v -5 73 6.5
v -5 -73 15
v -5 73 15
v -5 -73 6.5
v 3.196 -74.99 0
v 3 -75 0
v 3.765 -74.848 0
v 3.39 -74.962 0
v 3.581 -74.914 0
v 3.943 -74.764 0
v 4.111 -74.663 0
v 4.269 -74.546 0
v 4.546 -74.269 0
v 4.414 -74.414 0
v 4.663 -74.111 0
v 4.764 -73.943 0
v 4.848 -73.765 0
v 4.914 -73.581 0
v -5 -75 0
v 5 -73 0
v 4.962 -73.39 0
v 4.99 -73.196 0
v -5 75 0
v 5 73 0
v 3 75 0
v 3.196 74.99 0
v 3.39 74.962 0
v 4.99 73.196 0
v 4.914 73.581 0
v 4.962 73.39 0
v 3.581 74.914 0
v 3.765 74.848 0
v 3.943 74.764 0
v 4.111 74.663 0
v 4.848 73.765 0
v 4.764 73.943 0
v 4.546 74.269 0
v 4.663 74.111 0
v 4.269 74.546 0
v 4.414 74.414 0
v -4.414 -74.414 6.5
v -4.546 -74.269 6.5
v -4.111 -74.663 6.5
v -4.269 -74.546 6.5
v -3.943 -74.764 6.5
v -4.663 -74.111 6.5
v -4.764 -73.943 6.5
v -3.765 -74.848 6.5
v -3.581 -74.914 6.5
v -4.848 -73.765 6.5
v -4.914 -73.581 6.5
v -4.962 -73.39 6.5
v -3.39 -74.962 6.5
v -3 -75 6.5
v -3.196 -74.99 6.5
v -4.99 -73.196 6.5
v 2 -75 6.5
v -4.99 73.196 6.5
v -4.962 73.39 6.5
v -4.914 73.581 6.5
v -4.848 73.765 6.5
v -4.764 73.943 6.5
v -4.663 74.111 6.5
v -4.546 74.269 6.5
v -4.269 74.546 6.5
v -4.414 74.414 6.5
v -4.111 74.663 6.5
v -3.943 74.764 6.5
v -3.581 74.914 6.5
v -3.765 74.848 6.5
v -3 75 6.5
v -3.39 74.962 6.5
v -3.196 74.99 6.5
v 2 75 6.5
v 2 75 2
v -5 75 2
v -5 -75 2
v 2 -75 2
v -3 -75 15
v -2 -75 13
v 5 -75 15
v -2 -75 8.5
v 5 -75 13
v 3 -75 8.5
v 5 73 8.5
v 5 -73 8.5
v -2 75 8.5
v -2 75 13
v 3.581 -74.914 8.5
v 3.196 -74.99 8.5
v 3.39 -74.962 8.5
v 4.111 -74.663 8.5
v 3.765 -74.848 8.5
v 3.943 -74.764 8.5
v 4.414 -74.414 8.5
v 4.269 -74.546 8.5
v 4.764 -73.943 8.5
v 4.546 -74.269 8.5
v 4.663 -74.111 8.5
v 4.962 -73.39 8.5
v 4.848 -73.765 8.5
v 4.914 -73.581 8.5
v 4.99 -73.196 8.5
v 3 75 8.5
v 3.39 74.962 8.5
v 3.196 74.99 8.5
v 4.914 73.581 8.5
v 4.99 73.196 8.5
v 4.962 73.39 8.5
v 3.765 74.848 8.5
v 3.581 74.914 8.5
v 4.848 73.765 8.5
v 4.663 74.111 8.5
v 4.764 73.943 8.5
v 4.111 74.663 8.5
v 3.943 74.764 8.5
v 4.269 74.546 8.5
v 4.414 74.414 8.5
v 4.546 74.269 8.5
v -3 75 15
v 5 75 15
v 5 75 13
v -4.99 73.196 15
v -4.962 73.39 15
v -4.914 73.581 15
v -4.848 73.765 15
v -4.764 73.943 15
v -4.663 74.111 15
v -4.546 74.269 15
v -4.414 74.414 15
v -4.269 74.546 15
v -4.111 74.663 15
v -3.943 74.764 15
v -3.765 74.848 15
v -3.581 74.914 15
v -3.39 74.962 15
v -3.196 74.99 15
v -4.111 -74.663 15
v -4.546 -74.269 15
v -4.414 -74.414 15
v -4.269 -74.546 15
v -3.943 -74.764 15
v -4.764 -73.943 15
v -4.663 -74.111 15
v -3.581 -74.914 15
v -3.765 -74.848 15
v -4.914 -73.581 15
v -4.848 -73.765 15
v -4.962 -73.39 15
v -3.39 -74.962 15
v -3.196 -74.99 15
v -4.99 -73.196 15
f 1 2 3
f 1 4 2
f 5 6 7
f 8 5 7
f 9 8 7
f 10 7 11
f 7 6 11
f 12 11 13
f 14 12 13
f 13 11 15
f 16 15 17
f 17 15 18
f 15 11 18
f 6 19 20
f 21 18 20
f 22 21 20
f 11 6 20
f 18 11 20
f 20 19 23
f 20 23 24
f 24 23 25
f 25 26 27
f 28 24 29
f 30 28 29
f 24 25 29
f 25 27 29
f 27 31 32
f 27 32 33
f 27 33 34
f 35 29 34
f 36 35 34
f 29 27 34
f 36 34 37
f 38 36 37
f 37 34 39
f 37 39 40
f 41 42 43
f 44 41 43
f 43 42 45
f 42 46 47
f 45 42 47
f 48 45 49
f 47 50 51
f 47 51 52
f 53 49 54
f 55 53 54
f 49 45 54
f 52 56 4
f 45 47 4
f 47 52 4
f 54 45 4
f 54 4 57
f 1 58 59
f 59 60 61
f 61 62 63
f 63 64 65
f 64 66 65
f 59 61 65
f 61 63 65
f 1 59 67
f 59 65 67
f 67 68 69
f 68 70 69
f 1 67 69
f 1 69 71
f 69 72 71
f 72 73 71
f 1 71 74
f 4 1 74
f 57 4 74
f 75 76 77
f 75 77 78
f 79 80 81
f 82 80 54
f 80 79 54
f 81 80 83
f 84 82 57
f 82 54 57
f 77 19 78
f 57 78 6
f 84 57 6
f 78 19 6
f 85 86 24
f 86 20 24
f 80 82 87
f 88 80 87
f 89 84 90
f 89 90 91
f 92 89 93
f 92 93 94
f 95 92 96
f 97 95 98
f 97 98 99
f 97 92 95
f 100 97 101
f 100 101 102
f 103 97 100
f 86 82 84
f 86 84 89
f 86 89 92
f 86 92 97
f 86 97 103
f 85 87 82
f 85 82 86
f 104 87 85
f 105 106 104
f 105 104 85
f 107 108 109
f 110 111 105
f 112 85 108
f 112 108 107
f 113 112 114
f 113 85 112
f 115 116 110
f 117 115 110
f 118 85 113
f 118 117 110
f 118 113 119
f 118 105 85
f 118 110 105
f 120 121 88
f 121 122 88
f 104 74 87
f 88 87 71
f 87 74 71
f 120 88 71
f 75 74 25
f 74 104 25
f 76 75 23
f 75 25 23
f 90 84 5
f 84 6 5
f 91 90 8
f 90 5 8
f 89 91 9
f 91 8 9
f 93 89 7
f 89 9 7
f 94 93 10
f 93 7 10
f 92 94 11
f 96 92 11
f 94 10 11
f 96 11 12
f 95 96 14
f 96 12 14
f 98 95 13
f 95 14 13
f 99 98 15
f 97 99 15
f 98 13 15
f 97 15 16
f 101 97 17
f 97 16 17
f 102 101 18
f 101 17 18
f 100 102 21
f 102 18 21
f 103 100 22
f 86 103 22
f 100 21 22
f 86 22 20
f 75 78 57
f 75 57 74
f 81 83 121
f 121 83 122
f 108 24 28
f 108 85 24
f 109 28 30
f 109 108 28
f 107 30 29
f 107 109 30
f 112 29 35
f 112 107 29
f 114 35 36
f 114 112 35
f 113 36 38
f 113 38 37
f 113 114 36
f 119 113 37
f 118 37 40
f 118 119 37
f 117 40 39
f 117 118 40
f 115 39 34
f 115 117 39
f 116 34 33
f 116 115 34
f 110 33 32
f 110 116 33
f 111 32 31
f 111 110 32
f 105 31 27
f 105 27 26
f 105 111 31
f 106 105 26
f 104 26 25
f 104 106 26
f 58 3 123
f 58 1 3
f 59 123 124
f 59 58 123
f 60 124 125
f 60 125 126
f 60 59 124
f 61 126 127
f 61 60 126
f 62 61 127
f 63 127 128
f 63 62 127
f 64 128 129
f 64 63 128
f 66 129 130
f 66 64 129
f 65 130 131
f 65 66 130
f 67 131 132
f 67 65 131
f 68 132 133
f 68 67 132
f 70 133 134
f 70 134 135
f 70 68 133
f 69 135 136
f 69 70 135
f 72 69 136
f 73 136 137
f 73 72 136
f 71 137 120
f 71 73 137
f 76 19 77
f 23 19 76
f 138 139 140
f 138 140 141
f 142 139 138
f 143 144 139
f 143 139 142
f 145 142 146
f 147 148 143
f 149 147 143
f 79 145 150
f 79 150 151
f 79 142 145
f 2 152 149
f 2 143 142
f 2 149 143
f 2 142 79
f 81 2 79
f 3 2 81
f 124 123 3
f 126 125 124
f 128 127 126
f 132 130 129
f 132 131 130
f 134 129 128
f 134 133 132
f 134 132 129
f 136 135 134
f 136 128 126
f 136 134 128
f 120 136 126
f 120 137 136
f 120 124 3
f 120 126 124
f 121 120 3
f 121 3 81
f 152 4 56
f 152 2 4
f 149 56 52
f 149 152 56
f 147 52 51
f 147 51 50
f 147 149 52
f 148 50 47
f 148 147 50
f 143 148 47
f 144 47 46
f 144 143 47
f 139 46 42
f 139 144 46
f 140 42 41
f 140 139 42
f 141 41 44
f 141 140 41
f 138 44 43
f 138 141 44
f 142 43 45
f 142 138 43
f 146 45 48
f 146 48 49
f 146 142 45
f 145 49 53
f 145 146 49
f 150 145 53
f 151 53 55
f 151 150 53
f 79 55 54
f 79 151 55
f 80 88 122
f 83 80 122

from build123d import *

# Parameters (mm, degrees)
F0_W     = 10
F0_H     = 150
F1_DEPTH = 2
F2_W     = 3
F2_H     = 150
F3_DEPTH = 4.5
F4_W     = 3
F4_H     = 150
F4_W_2   = 7
F5_DEPTH = 2
F6_W     = 3
F6_H     = 150
F7_DEPTH = 4.5
F8_W     = 3
F8_H     = 150
F8_W_2   = 7
F9_DEPTH = 2
F10_R    = 2


# Not quite as in the source:
# - a feature names something its author has since deleted; it is built from what else it names


with BuildPart() as f1:
    # F0 (on Top) → F1 (new body)
    with BuildSketch(Plane.XY):
        Rectangle(F0_W, F0_H)
    extrude(amount=F1_DEPTH)

    # F2 (on face) → F3 (join)
    with BuildSketch(Plane.XY.offset(2)):
        with Locations((3.5, 0)):
            Rectangle(F2_W, F2_H)
    extrude(amount=F3_DEPTH)

    # F4 (on face) → F5 (join)
    with BuildSketch(Plane.XY.offset(6.5)):
        with Locations((3.5, 0)):
            Rectangle(F4_W, F4_H)
        with Locations((-1.5, 0)):
            Rectangle(F4_W_2, F4_H)
    extrude(amount=F5_DEPTH)

    # F6 (on face) → F7 (join)
    with BuildSketch(Plane.XY.offset(8.5)):
        with Locations((-3.5, 0)):
            Rectangle(F6_W, F6_H)
    extrude(amount=F7_DEPTH)

    # F8 (on face) → F9 (join)
    with BuildSketch(Plane.XY.offset(13)):
        with Locations((-3.5, 0)):
            Rectangle(F8_W, F8_H)
        with Locations((1.5, 0)):
            Rectangle(F8_W_2, F8_H)
    extrude(amount=F9_DEPTH)

    # F10
    f10_edges = [f1.edges().sort_by_distance(p)[0] for p in [
        (-5, 75, 10.75),
        (5, 75, 4.25),
        (-5, -75, 10.75),
        (5, -75, 4.25),
    ]]
    fillet(f10_edges, radius=F10_R)


solid = f1.part
